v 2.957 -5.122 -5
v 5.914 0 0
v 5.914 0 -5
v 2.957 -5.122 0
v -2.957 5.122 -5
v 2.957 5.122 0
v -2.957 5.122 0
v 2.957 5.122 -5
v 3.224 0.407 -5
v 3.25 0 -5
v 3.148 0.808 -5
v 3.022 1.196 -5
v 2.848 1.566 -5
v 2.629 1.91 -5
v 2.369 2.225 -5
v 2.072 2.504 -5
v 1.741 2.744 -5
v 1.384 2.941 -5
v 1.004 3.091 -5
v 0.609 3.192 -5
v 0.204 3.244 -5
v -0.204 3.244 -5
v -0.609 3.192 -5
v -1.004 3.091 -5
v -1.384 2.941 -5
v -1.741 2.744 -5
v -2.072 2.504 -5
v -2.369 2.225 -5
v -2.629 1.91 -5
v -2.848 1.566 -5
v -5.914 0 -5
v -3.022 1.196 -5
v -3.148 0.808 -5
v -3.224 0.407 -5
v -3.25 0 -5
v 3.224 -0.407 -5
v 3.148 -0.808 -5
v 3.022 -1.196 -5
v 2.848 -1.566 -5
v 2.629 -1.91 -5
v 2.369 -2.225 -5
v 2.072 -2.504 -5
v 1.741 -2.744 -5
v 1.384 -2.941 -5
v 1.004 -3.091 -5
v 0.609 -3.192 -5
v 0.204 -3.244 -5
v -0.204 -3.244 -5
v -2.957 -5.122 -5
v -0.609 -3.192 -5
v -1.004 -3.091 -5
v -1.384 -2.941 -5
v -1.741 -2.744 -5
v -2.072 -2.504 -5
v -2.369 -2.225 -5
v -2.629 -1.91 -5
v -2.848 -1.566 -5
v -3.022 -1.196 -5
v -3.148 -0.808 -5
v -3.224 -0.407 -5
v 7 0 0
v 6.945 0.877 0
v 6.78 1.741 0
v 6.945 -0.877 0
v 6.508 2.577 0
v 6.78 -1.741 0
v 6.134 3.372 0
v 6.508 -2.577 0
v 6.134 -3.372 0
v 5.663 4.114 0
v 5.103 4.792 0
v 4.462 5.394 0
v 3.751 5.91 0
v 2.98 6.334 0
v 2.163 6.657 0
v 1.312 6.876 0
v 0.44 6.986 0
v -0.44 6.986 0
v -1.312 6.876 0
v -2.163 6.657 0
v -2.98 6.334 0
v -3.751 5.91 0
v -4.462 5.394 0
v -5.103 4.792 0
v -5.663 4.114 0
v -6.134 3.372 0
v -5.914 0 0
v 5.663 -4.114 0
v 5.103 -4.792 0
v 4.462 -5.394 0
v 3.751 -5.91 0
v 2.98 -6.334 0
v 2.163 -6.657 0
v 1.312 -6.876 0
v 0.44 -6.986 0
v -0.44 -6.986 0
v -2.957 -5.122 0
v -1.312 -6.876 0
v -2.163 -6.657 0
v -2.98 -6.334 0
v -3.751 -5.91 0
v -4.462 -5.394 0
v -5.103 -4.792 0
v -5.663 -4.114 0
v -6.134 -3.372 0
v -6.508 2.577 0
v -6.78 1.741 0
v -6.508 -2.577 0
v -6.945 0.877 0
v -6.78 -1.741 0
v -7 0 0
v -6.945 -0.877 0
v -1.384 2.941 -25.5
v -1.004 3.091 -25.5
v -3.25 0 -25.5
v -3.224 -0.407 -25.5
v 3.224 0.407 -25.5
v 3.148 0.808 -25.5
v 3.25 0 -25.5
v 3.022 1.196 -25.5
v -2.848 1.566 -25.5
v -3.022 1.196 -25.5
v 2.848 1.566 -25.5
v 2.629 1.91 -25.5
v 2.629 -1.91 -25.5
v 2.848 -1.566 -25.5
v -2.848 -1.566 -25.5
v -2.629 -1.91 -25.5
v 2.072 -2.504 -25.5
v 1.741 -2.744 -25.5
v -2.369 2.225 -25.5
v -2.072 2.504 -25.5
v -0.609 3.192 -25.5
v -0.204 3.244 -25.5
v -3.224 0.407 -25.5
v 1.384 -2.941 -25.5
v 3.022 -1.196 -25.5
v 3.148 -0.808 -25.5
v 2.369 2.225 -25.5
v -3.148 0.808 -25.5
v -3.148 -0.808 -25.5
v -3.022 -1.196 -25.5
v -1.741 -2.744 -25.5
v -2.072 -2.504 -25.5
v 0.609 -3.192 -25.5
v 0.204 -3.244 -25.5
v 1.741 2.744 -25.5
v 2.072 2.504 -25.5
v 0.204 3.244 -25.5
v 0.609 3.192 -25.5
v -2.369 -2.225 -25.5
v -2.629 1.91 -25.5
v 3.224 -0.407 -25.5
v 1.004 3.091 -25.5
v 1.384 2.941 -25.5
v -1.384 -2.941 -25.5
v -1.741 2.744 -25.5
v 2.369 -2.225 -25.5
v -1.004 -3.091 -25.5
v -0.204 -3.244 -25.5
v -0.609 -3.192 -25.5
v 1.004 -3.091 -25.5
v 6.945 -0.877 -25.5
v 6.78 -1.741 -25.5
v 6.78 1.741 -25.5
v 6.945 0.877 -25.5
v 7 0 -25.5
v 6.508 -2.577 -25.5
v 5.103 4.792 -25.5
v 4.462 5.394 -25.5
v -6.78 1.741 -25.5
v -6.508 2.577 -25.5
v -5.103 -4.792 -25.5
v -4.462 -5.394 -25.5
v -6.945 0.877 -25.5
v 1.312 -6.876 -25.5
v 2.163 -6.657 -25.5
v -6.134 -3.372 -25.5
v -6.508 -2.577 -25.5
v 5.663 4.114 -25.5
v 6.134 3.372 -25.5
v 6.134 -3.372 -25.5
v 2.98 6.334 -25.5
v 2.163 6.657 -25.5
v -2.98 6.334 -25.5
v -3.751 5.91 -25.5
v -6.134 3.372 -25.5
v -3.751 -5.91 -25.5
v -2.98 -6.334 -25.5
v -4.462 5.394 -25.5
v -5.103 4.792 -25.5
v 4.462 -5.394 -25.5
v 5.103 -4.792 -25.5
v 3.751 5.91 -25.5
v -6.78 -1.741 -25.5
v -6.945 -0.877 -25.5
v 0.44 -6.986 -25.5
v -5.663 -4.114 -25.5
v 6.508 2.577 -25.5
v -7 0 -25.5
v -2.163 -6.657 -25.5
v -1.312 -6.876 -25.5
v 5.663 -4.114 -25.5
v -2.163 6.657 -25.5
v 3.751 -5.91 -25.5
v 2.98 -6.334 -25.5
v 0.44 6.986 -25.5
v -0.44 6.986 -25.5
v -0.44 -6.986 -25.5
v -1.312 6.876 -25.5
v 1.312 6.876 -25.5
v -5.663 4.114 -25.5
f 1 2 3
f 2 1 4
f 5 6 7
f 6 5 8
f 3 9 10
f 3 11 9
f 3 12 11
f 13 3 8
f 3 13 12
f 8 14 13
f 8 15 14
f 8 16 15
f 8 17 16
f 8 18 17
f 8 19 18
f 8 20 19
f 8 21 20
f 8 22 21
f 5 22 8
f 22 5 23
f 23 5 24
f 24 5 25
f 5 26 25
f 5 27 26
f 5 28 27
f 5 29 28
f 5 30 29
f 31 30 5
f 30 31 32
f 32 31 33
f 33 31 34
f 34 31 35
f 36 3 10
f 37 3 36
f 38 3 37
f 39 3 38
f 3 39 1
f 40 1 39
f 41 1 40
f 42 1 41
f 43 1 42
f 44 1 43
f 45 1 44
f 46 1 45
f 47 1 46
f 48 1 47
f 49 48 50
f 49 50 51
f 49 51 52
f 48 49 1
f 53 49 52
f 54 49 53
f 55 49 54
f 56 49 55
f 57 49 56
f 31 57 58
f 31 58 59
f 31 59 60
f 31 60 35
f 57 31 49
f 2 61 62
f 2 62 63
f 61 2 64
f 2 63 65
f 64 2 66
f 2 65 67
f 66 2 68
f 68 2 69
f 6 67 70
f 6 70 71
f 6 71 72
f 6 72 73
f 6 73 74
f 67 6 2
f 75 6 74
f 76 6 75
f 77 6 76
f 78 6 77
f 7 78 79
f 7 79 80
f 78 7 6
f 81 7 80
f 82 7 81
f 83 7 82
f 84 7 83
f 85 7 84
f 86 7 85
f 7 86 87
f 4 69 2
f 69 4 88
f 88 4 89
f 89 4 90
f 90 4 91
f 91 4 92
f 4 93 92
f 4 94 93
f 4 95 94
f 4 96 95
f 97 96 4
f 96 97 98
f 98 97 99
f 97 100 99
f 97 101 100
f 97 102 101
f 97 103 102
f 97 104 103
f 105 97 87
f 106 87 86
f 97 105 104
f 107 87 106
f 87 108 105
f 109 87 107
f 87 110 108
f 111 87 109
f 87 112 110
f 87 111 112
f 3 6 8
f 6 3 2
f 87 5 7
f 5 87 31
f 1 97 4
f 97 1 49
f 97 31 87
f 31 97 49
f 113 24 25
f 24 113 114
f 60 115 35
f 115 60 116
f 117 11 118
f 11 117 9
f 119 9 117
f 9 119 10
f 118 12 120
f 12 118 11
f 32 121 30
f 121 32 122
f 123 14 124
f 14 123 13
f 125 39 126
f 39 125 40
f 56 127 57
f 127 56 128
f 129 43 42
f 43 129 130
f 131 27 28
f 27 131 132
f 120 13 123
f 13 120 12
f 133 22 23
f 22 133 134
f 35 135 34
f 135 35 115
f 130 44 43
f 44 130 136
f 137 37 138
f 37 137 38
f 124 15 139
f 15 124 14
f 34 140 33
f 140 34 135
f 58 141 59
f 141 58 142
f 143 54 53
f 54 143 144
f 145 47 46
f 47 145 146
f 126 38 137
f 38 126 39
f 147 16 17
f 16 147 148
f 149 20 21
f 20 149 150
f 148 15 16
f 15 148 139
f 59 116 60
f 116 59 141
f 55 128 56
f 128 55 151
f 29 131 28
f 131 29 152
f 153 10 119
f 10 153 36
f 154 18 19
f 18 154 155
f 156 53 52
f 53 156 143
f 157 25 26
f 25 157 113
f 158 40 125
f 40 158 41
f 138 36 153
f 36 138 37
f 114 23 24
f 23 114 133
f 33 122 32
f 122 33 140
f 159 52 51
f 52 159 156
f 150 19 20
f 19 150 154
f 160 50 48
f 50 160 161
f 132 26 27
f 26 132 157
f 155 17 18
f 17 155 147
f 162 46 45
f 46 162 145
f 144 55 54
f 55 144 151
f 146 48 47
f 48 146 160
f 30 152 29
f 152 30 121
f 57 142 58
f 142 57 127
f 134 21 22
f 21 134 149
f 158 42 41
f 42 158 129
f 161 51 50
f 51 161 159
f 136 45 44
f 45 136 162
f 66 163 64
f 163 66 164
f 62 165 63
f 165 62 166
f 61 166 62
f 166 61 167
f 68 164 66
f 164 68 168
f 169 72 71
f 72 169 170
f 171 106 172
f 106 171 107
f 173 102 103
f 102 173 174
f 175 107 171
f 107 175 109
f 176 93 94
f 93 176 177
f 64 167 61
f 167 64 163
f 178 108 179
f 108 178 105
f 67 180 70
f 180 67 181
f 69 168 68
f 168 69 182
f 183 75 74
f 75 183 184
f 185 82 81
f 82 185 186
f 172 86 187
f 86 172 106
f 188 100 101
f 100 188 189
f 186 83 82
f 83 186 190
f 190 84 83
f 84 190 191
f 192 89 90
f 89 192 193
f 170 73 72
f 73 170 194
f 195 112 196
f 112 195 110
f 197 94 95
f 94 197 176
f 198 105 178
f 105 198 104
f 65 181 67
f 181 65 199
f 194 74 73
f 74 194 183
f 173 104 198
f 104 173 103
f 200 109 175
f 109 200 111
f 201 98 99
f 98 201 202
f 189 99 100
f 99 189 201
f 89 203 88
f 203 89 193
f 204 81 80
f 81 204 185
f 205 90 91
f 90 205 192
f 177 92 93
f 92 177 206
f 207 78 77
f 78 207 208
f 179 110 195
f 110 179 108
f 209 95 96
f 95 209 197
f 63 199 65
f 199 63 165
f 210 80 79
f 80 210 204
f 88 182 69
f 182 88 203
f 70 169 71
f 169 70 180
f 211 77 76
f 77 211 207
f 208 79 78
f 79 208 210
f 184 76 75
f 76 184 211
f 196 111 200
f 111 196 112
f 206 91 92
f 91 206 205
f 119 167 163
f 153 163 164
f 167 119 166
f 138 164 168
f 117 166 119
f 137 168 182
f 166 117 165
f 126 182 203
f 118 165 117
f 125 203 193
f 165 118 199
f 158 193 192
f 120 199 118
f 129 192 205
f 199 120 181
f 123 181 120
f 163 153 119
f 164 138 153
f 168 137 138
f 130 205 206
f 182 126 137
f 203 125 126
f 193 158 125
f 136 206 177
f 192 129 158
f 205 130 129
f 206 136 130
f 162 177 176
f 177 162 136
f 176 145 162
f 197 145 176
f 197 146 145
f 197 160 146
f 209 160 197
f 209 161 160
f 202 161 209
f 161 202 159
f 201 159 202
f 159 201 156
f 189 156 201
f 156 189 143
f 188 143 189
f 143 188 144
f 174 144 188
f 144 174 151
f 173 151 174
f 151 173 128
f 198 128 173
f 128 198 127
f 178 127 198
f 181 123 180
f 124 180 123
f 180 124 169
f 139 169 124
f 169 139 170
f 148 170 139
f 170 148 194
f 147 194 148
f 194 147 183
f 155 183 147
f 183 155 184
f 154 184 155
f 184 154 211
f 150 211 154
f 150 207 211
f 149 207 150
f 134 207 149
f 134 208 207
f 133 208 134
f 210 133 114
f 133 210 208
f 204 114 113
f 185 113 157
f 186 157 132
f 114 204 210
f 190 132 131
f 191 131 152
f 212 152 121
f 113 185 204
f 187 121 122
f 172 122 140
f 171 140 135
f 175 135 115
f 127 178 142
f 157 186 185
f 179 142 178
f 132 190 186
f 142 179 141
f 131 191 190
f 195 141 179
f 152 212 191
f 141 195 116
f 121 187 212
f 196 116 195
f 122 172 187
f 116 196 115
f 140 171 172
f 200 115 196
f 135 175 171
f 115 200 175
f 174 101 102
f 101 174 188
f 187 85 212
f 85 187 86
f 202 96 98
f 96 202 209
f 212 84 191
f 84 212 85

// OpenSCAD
$fn = 50;

difference() {
	union() {
		translate(v = [0, 0, -25.5]) {
			cylinder(h = 25.5, r = 7.0);
		}
	}
	union() {
		translate(v = [0, 0, 0]) {
			rotate(a = [0, 0, 0]) {
				difference() {
					union() {
						translate(v = [0, 0, -5]) {
							linear_extrude(height = 5) {
								polygon(points = [[5.914249999999999, 0.0], [2.957125, 5.1218907443321156], [-2.9571249999999982, 5.1218907443321156], [-5.914249999999999, 7.242867331857232e-16], [-2.9571250000000022, -5.121890744332115], [2.9571249999999956, -5.121890744332118]]);
							}
						}
					}
					union();
				}
			}
		}
		#translate(v = [0, 0, -100.0]) {
			cylinder(h = 200, r = 3.25);
		}
	}
}
